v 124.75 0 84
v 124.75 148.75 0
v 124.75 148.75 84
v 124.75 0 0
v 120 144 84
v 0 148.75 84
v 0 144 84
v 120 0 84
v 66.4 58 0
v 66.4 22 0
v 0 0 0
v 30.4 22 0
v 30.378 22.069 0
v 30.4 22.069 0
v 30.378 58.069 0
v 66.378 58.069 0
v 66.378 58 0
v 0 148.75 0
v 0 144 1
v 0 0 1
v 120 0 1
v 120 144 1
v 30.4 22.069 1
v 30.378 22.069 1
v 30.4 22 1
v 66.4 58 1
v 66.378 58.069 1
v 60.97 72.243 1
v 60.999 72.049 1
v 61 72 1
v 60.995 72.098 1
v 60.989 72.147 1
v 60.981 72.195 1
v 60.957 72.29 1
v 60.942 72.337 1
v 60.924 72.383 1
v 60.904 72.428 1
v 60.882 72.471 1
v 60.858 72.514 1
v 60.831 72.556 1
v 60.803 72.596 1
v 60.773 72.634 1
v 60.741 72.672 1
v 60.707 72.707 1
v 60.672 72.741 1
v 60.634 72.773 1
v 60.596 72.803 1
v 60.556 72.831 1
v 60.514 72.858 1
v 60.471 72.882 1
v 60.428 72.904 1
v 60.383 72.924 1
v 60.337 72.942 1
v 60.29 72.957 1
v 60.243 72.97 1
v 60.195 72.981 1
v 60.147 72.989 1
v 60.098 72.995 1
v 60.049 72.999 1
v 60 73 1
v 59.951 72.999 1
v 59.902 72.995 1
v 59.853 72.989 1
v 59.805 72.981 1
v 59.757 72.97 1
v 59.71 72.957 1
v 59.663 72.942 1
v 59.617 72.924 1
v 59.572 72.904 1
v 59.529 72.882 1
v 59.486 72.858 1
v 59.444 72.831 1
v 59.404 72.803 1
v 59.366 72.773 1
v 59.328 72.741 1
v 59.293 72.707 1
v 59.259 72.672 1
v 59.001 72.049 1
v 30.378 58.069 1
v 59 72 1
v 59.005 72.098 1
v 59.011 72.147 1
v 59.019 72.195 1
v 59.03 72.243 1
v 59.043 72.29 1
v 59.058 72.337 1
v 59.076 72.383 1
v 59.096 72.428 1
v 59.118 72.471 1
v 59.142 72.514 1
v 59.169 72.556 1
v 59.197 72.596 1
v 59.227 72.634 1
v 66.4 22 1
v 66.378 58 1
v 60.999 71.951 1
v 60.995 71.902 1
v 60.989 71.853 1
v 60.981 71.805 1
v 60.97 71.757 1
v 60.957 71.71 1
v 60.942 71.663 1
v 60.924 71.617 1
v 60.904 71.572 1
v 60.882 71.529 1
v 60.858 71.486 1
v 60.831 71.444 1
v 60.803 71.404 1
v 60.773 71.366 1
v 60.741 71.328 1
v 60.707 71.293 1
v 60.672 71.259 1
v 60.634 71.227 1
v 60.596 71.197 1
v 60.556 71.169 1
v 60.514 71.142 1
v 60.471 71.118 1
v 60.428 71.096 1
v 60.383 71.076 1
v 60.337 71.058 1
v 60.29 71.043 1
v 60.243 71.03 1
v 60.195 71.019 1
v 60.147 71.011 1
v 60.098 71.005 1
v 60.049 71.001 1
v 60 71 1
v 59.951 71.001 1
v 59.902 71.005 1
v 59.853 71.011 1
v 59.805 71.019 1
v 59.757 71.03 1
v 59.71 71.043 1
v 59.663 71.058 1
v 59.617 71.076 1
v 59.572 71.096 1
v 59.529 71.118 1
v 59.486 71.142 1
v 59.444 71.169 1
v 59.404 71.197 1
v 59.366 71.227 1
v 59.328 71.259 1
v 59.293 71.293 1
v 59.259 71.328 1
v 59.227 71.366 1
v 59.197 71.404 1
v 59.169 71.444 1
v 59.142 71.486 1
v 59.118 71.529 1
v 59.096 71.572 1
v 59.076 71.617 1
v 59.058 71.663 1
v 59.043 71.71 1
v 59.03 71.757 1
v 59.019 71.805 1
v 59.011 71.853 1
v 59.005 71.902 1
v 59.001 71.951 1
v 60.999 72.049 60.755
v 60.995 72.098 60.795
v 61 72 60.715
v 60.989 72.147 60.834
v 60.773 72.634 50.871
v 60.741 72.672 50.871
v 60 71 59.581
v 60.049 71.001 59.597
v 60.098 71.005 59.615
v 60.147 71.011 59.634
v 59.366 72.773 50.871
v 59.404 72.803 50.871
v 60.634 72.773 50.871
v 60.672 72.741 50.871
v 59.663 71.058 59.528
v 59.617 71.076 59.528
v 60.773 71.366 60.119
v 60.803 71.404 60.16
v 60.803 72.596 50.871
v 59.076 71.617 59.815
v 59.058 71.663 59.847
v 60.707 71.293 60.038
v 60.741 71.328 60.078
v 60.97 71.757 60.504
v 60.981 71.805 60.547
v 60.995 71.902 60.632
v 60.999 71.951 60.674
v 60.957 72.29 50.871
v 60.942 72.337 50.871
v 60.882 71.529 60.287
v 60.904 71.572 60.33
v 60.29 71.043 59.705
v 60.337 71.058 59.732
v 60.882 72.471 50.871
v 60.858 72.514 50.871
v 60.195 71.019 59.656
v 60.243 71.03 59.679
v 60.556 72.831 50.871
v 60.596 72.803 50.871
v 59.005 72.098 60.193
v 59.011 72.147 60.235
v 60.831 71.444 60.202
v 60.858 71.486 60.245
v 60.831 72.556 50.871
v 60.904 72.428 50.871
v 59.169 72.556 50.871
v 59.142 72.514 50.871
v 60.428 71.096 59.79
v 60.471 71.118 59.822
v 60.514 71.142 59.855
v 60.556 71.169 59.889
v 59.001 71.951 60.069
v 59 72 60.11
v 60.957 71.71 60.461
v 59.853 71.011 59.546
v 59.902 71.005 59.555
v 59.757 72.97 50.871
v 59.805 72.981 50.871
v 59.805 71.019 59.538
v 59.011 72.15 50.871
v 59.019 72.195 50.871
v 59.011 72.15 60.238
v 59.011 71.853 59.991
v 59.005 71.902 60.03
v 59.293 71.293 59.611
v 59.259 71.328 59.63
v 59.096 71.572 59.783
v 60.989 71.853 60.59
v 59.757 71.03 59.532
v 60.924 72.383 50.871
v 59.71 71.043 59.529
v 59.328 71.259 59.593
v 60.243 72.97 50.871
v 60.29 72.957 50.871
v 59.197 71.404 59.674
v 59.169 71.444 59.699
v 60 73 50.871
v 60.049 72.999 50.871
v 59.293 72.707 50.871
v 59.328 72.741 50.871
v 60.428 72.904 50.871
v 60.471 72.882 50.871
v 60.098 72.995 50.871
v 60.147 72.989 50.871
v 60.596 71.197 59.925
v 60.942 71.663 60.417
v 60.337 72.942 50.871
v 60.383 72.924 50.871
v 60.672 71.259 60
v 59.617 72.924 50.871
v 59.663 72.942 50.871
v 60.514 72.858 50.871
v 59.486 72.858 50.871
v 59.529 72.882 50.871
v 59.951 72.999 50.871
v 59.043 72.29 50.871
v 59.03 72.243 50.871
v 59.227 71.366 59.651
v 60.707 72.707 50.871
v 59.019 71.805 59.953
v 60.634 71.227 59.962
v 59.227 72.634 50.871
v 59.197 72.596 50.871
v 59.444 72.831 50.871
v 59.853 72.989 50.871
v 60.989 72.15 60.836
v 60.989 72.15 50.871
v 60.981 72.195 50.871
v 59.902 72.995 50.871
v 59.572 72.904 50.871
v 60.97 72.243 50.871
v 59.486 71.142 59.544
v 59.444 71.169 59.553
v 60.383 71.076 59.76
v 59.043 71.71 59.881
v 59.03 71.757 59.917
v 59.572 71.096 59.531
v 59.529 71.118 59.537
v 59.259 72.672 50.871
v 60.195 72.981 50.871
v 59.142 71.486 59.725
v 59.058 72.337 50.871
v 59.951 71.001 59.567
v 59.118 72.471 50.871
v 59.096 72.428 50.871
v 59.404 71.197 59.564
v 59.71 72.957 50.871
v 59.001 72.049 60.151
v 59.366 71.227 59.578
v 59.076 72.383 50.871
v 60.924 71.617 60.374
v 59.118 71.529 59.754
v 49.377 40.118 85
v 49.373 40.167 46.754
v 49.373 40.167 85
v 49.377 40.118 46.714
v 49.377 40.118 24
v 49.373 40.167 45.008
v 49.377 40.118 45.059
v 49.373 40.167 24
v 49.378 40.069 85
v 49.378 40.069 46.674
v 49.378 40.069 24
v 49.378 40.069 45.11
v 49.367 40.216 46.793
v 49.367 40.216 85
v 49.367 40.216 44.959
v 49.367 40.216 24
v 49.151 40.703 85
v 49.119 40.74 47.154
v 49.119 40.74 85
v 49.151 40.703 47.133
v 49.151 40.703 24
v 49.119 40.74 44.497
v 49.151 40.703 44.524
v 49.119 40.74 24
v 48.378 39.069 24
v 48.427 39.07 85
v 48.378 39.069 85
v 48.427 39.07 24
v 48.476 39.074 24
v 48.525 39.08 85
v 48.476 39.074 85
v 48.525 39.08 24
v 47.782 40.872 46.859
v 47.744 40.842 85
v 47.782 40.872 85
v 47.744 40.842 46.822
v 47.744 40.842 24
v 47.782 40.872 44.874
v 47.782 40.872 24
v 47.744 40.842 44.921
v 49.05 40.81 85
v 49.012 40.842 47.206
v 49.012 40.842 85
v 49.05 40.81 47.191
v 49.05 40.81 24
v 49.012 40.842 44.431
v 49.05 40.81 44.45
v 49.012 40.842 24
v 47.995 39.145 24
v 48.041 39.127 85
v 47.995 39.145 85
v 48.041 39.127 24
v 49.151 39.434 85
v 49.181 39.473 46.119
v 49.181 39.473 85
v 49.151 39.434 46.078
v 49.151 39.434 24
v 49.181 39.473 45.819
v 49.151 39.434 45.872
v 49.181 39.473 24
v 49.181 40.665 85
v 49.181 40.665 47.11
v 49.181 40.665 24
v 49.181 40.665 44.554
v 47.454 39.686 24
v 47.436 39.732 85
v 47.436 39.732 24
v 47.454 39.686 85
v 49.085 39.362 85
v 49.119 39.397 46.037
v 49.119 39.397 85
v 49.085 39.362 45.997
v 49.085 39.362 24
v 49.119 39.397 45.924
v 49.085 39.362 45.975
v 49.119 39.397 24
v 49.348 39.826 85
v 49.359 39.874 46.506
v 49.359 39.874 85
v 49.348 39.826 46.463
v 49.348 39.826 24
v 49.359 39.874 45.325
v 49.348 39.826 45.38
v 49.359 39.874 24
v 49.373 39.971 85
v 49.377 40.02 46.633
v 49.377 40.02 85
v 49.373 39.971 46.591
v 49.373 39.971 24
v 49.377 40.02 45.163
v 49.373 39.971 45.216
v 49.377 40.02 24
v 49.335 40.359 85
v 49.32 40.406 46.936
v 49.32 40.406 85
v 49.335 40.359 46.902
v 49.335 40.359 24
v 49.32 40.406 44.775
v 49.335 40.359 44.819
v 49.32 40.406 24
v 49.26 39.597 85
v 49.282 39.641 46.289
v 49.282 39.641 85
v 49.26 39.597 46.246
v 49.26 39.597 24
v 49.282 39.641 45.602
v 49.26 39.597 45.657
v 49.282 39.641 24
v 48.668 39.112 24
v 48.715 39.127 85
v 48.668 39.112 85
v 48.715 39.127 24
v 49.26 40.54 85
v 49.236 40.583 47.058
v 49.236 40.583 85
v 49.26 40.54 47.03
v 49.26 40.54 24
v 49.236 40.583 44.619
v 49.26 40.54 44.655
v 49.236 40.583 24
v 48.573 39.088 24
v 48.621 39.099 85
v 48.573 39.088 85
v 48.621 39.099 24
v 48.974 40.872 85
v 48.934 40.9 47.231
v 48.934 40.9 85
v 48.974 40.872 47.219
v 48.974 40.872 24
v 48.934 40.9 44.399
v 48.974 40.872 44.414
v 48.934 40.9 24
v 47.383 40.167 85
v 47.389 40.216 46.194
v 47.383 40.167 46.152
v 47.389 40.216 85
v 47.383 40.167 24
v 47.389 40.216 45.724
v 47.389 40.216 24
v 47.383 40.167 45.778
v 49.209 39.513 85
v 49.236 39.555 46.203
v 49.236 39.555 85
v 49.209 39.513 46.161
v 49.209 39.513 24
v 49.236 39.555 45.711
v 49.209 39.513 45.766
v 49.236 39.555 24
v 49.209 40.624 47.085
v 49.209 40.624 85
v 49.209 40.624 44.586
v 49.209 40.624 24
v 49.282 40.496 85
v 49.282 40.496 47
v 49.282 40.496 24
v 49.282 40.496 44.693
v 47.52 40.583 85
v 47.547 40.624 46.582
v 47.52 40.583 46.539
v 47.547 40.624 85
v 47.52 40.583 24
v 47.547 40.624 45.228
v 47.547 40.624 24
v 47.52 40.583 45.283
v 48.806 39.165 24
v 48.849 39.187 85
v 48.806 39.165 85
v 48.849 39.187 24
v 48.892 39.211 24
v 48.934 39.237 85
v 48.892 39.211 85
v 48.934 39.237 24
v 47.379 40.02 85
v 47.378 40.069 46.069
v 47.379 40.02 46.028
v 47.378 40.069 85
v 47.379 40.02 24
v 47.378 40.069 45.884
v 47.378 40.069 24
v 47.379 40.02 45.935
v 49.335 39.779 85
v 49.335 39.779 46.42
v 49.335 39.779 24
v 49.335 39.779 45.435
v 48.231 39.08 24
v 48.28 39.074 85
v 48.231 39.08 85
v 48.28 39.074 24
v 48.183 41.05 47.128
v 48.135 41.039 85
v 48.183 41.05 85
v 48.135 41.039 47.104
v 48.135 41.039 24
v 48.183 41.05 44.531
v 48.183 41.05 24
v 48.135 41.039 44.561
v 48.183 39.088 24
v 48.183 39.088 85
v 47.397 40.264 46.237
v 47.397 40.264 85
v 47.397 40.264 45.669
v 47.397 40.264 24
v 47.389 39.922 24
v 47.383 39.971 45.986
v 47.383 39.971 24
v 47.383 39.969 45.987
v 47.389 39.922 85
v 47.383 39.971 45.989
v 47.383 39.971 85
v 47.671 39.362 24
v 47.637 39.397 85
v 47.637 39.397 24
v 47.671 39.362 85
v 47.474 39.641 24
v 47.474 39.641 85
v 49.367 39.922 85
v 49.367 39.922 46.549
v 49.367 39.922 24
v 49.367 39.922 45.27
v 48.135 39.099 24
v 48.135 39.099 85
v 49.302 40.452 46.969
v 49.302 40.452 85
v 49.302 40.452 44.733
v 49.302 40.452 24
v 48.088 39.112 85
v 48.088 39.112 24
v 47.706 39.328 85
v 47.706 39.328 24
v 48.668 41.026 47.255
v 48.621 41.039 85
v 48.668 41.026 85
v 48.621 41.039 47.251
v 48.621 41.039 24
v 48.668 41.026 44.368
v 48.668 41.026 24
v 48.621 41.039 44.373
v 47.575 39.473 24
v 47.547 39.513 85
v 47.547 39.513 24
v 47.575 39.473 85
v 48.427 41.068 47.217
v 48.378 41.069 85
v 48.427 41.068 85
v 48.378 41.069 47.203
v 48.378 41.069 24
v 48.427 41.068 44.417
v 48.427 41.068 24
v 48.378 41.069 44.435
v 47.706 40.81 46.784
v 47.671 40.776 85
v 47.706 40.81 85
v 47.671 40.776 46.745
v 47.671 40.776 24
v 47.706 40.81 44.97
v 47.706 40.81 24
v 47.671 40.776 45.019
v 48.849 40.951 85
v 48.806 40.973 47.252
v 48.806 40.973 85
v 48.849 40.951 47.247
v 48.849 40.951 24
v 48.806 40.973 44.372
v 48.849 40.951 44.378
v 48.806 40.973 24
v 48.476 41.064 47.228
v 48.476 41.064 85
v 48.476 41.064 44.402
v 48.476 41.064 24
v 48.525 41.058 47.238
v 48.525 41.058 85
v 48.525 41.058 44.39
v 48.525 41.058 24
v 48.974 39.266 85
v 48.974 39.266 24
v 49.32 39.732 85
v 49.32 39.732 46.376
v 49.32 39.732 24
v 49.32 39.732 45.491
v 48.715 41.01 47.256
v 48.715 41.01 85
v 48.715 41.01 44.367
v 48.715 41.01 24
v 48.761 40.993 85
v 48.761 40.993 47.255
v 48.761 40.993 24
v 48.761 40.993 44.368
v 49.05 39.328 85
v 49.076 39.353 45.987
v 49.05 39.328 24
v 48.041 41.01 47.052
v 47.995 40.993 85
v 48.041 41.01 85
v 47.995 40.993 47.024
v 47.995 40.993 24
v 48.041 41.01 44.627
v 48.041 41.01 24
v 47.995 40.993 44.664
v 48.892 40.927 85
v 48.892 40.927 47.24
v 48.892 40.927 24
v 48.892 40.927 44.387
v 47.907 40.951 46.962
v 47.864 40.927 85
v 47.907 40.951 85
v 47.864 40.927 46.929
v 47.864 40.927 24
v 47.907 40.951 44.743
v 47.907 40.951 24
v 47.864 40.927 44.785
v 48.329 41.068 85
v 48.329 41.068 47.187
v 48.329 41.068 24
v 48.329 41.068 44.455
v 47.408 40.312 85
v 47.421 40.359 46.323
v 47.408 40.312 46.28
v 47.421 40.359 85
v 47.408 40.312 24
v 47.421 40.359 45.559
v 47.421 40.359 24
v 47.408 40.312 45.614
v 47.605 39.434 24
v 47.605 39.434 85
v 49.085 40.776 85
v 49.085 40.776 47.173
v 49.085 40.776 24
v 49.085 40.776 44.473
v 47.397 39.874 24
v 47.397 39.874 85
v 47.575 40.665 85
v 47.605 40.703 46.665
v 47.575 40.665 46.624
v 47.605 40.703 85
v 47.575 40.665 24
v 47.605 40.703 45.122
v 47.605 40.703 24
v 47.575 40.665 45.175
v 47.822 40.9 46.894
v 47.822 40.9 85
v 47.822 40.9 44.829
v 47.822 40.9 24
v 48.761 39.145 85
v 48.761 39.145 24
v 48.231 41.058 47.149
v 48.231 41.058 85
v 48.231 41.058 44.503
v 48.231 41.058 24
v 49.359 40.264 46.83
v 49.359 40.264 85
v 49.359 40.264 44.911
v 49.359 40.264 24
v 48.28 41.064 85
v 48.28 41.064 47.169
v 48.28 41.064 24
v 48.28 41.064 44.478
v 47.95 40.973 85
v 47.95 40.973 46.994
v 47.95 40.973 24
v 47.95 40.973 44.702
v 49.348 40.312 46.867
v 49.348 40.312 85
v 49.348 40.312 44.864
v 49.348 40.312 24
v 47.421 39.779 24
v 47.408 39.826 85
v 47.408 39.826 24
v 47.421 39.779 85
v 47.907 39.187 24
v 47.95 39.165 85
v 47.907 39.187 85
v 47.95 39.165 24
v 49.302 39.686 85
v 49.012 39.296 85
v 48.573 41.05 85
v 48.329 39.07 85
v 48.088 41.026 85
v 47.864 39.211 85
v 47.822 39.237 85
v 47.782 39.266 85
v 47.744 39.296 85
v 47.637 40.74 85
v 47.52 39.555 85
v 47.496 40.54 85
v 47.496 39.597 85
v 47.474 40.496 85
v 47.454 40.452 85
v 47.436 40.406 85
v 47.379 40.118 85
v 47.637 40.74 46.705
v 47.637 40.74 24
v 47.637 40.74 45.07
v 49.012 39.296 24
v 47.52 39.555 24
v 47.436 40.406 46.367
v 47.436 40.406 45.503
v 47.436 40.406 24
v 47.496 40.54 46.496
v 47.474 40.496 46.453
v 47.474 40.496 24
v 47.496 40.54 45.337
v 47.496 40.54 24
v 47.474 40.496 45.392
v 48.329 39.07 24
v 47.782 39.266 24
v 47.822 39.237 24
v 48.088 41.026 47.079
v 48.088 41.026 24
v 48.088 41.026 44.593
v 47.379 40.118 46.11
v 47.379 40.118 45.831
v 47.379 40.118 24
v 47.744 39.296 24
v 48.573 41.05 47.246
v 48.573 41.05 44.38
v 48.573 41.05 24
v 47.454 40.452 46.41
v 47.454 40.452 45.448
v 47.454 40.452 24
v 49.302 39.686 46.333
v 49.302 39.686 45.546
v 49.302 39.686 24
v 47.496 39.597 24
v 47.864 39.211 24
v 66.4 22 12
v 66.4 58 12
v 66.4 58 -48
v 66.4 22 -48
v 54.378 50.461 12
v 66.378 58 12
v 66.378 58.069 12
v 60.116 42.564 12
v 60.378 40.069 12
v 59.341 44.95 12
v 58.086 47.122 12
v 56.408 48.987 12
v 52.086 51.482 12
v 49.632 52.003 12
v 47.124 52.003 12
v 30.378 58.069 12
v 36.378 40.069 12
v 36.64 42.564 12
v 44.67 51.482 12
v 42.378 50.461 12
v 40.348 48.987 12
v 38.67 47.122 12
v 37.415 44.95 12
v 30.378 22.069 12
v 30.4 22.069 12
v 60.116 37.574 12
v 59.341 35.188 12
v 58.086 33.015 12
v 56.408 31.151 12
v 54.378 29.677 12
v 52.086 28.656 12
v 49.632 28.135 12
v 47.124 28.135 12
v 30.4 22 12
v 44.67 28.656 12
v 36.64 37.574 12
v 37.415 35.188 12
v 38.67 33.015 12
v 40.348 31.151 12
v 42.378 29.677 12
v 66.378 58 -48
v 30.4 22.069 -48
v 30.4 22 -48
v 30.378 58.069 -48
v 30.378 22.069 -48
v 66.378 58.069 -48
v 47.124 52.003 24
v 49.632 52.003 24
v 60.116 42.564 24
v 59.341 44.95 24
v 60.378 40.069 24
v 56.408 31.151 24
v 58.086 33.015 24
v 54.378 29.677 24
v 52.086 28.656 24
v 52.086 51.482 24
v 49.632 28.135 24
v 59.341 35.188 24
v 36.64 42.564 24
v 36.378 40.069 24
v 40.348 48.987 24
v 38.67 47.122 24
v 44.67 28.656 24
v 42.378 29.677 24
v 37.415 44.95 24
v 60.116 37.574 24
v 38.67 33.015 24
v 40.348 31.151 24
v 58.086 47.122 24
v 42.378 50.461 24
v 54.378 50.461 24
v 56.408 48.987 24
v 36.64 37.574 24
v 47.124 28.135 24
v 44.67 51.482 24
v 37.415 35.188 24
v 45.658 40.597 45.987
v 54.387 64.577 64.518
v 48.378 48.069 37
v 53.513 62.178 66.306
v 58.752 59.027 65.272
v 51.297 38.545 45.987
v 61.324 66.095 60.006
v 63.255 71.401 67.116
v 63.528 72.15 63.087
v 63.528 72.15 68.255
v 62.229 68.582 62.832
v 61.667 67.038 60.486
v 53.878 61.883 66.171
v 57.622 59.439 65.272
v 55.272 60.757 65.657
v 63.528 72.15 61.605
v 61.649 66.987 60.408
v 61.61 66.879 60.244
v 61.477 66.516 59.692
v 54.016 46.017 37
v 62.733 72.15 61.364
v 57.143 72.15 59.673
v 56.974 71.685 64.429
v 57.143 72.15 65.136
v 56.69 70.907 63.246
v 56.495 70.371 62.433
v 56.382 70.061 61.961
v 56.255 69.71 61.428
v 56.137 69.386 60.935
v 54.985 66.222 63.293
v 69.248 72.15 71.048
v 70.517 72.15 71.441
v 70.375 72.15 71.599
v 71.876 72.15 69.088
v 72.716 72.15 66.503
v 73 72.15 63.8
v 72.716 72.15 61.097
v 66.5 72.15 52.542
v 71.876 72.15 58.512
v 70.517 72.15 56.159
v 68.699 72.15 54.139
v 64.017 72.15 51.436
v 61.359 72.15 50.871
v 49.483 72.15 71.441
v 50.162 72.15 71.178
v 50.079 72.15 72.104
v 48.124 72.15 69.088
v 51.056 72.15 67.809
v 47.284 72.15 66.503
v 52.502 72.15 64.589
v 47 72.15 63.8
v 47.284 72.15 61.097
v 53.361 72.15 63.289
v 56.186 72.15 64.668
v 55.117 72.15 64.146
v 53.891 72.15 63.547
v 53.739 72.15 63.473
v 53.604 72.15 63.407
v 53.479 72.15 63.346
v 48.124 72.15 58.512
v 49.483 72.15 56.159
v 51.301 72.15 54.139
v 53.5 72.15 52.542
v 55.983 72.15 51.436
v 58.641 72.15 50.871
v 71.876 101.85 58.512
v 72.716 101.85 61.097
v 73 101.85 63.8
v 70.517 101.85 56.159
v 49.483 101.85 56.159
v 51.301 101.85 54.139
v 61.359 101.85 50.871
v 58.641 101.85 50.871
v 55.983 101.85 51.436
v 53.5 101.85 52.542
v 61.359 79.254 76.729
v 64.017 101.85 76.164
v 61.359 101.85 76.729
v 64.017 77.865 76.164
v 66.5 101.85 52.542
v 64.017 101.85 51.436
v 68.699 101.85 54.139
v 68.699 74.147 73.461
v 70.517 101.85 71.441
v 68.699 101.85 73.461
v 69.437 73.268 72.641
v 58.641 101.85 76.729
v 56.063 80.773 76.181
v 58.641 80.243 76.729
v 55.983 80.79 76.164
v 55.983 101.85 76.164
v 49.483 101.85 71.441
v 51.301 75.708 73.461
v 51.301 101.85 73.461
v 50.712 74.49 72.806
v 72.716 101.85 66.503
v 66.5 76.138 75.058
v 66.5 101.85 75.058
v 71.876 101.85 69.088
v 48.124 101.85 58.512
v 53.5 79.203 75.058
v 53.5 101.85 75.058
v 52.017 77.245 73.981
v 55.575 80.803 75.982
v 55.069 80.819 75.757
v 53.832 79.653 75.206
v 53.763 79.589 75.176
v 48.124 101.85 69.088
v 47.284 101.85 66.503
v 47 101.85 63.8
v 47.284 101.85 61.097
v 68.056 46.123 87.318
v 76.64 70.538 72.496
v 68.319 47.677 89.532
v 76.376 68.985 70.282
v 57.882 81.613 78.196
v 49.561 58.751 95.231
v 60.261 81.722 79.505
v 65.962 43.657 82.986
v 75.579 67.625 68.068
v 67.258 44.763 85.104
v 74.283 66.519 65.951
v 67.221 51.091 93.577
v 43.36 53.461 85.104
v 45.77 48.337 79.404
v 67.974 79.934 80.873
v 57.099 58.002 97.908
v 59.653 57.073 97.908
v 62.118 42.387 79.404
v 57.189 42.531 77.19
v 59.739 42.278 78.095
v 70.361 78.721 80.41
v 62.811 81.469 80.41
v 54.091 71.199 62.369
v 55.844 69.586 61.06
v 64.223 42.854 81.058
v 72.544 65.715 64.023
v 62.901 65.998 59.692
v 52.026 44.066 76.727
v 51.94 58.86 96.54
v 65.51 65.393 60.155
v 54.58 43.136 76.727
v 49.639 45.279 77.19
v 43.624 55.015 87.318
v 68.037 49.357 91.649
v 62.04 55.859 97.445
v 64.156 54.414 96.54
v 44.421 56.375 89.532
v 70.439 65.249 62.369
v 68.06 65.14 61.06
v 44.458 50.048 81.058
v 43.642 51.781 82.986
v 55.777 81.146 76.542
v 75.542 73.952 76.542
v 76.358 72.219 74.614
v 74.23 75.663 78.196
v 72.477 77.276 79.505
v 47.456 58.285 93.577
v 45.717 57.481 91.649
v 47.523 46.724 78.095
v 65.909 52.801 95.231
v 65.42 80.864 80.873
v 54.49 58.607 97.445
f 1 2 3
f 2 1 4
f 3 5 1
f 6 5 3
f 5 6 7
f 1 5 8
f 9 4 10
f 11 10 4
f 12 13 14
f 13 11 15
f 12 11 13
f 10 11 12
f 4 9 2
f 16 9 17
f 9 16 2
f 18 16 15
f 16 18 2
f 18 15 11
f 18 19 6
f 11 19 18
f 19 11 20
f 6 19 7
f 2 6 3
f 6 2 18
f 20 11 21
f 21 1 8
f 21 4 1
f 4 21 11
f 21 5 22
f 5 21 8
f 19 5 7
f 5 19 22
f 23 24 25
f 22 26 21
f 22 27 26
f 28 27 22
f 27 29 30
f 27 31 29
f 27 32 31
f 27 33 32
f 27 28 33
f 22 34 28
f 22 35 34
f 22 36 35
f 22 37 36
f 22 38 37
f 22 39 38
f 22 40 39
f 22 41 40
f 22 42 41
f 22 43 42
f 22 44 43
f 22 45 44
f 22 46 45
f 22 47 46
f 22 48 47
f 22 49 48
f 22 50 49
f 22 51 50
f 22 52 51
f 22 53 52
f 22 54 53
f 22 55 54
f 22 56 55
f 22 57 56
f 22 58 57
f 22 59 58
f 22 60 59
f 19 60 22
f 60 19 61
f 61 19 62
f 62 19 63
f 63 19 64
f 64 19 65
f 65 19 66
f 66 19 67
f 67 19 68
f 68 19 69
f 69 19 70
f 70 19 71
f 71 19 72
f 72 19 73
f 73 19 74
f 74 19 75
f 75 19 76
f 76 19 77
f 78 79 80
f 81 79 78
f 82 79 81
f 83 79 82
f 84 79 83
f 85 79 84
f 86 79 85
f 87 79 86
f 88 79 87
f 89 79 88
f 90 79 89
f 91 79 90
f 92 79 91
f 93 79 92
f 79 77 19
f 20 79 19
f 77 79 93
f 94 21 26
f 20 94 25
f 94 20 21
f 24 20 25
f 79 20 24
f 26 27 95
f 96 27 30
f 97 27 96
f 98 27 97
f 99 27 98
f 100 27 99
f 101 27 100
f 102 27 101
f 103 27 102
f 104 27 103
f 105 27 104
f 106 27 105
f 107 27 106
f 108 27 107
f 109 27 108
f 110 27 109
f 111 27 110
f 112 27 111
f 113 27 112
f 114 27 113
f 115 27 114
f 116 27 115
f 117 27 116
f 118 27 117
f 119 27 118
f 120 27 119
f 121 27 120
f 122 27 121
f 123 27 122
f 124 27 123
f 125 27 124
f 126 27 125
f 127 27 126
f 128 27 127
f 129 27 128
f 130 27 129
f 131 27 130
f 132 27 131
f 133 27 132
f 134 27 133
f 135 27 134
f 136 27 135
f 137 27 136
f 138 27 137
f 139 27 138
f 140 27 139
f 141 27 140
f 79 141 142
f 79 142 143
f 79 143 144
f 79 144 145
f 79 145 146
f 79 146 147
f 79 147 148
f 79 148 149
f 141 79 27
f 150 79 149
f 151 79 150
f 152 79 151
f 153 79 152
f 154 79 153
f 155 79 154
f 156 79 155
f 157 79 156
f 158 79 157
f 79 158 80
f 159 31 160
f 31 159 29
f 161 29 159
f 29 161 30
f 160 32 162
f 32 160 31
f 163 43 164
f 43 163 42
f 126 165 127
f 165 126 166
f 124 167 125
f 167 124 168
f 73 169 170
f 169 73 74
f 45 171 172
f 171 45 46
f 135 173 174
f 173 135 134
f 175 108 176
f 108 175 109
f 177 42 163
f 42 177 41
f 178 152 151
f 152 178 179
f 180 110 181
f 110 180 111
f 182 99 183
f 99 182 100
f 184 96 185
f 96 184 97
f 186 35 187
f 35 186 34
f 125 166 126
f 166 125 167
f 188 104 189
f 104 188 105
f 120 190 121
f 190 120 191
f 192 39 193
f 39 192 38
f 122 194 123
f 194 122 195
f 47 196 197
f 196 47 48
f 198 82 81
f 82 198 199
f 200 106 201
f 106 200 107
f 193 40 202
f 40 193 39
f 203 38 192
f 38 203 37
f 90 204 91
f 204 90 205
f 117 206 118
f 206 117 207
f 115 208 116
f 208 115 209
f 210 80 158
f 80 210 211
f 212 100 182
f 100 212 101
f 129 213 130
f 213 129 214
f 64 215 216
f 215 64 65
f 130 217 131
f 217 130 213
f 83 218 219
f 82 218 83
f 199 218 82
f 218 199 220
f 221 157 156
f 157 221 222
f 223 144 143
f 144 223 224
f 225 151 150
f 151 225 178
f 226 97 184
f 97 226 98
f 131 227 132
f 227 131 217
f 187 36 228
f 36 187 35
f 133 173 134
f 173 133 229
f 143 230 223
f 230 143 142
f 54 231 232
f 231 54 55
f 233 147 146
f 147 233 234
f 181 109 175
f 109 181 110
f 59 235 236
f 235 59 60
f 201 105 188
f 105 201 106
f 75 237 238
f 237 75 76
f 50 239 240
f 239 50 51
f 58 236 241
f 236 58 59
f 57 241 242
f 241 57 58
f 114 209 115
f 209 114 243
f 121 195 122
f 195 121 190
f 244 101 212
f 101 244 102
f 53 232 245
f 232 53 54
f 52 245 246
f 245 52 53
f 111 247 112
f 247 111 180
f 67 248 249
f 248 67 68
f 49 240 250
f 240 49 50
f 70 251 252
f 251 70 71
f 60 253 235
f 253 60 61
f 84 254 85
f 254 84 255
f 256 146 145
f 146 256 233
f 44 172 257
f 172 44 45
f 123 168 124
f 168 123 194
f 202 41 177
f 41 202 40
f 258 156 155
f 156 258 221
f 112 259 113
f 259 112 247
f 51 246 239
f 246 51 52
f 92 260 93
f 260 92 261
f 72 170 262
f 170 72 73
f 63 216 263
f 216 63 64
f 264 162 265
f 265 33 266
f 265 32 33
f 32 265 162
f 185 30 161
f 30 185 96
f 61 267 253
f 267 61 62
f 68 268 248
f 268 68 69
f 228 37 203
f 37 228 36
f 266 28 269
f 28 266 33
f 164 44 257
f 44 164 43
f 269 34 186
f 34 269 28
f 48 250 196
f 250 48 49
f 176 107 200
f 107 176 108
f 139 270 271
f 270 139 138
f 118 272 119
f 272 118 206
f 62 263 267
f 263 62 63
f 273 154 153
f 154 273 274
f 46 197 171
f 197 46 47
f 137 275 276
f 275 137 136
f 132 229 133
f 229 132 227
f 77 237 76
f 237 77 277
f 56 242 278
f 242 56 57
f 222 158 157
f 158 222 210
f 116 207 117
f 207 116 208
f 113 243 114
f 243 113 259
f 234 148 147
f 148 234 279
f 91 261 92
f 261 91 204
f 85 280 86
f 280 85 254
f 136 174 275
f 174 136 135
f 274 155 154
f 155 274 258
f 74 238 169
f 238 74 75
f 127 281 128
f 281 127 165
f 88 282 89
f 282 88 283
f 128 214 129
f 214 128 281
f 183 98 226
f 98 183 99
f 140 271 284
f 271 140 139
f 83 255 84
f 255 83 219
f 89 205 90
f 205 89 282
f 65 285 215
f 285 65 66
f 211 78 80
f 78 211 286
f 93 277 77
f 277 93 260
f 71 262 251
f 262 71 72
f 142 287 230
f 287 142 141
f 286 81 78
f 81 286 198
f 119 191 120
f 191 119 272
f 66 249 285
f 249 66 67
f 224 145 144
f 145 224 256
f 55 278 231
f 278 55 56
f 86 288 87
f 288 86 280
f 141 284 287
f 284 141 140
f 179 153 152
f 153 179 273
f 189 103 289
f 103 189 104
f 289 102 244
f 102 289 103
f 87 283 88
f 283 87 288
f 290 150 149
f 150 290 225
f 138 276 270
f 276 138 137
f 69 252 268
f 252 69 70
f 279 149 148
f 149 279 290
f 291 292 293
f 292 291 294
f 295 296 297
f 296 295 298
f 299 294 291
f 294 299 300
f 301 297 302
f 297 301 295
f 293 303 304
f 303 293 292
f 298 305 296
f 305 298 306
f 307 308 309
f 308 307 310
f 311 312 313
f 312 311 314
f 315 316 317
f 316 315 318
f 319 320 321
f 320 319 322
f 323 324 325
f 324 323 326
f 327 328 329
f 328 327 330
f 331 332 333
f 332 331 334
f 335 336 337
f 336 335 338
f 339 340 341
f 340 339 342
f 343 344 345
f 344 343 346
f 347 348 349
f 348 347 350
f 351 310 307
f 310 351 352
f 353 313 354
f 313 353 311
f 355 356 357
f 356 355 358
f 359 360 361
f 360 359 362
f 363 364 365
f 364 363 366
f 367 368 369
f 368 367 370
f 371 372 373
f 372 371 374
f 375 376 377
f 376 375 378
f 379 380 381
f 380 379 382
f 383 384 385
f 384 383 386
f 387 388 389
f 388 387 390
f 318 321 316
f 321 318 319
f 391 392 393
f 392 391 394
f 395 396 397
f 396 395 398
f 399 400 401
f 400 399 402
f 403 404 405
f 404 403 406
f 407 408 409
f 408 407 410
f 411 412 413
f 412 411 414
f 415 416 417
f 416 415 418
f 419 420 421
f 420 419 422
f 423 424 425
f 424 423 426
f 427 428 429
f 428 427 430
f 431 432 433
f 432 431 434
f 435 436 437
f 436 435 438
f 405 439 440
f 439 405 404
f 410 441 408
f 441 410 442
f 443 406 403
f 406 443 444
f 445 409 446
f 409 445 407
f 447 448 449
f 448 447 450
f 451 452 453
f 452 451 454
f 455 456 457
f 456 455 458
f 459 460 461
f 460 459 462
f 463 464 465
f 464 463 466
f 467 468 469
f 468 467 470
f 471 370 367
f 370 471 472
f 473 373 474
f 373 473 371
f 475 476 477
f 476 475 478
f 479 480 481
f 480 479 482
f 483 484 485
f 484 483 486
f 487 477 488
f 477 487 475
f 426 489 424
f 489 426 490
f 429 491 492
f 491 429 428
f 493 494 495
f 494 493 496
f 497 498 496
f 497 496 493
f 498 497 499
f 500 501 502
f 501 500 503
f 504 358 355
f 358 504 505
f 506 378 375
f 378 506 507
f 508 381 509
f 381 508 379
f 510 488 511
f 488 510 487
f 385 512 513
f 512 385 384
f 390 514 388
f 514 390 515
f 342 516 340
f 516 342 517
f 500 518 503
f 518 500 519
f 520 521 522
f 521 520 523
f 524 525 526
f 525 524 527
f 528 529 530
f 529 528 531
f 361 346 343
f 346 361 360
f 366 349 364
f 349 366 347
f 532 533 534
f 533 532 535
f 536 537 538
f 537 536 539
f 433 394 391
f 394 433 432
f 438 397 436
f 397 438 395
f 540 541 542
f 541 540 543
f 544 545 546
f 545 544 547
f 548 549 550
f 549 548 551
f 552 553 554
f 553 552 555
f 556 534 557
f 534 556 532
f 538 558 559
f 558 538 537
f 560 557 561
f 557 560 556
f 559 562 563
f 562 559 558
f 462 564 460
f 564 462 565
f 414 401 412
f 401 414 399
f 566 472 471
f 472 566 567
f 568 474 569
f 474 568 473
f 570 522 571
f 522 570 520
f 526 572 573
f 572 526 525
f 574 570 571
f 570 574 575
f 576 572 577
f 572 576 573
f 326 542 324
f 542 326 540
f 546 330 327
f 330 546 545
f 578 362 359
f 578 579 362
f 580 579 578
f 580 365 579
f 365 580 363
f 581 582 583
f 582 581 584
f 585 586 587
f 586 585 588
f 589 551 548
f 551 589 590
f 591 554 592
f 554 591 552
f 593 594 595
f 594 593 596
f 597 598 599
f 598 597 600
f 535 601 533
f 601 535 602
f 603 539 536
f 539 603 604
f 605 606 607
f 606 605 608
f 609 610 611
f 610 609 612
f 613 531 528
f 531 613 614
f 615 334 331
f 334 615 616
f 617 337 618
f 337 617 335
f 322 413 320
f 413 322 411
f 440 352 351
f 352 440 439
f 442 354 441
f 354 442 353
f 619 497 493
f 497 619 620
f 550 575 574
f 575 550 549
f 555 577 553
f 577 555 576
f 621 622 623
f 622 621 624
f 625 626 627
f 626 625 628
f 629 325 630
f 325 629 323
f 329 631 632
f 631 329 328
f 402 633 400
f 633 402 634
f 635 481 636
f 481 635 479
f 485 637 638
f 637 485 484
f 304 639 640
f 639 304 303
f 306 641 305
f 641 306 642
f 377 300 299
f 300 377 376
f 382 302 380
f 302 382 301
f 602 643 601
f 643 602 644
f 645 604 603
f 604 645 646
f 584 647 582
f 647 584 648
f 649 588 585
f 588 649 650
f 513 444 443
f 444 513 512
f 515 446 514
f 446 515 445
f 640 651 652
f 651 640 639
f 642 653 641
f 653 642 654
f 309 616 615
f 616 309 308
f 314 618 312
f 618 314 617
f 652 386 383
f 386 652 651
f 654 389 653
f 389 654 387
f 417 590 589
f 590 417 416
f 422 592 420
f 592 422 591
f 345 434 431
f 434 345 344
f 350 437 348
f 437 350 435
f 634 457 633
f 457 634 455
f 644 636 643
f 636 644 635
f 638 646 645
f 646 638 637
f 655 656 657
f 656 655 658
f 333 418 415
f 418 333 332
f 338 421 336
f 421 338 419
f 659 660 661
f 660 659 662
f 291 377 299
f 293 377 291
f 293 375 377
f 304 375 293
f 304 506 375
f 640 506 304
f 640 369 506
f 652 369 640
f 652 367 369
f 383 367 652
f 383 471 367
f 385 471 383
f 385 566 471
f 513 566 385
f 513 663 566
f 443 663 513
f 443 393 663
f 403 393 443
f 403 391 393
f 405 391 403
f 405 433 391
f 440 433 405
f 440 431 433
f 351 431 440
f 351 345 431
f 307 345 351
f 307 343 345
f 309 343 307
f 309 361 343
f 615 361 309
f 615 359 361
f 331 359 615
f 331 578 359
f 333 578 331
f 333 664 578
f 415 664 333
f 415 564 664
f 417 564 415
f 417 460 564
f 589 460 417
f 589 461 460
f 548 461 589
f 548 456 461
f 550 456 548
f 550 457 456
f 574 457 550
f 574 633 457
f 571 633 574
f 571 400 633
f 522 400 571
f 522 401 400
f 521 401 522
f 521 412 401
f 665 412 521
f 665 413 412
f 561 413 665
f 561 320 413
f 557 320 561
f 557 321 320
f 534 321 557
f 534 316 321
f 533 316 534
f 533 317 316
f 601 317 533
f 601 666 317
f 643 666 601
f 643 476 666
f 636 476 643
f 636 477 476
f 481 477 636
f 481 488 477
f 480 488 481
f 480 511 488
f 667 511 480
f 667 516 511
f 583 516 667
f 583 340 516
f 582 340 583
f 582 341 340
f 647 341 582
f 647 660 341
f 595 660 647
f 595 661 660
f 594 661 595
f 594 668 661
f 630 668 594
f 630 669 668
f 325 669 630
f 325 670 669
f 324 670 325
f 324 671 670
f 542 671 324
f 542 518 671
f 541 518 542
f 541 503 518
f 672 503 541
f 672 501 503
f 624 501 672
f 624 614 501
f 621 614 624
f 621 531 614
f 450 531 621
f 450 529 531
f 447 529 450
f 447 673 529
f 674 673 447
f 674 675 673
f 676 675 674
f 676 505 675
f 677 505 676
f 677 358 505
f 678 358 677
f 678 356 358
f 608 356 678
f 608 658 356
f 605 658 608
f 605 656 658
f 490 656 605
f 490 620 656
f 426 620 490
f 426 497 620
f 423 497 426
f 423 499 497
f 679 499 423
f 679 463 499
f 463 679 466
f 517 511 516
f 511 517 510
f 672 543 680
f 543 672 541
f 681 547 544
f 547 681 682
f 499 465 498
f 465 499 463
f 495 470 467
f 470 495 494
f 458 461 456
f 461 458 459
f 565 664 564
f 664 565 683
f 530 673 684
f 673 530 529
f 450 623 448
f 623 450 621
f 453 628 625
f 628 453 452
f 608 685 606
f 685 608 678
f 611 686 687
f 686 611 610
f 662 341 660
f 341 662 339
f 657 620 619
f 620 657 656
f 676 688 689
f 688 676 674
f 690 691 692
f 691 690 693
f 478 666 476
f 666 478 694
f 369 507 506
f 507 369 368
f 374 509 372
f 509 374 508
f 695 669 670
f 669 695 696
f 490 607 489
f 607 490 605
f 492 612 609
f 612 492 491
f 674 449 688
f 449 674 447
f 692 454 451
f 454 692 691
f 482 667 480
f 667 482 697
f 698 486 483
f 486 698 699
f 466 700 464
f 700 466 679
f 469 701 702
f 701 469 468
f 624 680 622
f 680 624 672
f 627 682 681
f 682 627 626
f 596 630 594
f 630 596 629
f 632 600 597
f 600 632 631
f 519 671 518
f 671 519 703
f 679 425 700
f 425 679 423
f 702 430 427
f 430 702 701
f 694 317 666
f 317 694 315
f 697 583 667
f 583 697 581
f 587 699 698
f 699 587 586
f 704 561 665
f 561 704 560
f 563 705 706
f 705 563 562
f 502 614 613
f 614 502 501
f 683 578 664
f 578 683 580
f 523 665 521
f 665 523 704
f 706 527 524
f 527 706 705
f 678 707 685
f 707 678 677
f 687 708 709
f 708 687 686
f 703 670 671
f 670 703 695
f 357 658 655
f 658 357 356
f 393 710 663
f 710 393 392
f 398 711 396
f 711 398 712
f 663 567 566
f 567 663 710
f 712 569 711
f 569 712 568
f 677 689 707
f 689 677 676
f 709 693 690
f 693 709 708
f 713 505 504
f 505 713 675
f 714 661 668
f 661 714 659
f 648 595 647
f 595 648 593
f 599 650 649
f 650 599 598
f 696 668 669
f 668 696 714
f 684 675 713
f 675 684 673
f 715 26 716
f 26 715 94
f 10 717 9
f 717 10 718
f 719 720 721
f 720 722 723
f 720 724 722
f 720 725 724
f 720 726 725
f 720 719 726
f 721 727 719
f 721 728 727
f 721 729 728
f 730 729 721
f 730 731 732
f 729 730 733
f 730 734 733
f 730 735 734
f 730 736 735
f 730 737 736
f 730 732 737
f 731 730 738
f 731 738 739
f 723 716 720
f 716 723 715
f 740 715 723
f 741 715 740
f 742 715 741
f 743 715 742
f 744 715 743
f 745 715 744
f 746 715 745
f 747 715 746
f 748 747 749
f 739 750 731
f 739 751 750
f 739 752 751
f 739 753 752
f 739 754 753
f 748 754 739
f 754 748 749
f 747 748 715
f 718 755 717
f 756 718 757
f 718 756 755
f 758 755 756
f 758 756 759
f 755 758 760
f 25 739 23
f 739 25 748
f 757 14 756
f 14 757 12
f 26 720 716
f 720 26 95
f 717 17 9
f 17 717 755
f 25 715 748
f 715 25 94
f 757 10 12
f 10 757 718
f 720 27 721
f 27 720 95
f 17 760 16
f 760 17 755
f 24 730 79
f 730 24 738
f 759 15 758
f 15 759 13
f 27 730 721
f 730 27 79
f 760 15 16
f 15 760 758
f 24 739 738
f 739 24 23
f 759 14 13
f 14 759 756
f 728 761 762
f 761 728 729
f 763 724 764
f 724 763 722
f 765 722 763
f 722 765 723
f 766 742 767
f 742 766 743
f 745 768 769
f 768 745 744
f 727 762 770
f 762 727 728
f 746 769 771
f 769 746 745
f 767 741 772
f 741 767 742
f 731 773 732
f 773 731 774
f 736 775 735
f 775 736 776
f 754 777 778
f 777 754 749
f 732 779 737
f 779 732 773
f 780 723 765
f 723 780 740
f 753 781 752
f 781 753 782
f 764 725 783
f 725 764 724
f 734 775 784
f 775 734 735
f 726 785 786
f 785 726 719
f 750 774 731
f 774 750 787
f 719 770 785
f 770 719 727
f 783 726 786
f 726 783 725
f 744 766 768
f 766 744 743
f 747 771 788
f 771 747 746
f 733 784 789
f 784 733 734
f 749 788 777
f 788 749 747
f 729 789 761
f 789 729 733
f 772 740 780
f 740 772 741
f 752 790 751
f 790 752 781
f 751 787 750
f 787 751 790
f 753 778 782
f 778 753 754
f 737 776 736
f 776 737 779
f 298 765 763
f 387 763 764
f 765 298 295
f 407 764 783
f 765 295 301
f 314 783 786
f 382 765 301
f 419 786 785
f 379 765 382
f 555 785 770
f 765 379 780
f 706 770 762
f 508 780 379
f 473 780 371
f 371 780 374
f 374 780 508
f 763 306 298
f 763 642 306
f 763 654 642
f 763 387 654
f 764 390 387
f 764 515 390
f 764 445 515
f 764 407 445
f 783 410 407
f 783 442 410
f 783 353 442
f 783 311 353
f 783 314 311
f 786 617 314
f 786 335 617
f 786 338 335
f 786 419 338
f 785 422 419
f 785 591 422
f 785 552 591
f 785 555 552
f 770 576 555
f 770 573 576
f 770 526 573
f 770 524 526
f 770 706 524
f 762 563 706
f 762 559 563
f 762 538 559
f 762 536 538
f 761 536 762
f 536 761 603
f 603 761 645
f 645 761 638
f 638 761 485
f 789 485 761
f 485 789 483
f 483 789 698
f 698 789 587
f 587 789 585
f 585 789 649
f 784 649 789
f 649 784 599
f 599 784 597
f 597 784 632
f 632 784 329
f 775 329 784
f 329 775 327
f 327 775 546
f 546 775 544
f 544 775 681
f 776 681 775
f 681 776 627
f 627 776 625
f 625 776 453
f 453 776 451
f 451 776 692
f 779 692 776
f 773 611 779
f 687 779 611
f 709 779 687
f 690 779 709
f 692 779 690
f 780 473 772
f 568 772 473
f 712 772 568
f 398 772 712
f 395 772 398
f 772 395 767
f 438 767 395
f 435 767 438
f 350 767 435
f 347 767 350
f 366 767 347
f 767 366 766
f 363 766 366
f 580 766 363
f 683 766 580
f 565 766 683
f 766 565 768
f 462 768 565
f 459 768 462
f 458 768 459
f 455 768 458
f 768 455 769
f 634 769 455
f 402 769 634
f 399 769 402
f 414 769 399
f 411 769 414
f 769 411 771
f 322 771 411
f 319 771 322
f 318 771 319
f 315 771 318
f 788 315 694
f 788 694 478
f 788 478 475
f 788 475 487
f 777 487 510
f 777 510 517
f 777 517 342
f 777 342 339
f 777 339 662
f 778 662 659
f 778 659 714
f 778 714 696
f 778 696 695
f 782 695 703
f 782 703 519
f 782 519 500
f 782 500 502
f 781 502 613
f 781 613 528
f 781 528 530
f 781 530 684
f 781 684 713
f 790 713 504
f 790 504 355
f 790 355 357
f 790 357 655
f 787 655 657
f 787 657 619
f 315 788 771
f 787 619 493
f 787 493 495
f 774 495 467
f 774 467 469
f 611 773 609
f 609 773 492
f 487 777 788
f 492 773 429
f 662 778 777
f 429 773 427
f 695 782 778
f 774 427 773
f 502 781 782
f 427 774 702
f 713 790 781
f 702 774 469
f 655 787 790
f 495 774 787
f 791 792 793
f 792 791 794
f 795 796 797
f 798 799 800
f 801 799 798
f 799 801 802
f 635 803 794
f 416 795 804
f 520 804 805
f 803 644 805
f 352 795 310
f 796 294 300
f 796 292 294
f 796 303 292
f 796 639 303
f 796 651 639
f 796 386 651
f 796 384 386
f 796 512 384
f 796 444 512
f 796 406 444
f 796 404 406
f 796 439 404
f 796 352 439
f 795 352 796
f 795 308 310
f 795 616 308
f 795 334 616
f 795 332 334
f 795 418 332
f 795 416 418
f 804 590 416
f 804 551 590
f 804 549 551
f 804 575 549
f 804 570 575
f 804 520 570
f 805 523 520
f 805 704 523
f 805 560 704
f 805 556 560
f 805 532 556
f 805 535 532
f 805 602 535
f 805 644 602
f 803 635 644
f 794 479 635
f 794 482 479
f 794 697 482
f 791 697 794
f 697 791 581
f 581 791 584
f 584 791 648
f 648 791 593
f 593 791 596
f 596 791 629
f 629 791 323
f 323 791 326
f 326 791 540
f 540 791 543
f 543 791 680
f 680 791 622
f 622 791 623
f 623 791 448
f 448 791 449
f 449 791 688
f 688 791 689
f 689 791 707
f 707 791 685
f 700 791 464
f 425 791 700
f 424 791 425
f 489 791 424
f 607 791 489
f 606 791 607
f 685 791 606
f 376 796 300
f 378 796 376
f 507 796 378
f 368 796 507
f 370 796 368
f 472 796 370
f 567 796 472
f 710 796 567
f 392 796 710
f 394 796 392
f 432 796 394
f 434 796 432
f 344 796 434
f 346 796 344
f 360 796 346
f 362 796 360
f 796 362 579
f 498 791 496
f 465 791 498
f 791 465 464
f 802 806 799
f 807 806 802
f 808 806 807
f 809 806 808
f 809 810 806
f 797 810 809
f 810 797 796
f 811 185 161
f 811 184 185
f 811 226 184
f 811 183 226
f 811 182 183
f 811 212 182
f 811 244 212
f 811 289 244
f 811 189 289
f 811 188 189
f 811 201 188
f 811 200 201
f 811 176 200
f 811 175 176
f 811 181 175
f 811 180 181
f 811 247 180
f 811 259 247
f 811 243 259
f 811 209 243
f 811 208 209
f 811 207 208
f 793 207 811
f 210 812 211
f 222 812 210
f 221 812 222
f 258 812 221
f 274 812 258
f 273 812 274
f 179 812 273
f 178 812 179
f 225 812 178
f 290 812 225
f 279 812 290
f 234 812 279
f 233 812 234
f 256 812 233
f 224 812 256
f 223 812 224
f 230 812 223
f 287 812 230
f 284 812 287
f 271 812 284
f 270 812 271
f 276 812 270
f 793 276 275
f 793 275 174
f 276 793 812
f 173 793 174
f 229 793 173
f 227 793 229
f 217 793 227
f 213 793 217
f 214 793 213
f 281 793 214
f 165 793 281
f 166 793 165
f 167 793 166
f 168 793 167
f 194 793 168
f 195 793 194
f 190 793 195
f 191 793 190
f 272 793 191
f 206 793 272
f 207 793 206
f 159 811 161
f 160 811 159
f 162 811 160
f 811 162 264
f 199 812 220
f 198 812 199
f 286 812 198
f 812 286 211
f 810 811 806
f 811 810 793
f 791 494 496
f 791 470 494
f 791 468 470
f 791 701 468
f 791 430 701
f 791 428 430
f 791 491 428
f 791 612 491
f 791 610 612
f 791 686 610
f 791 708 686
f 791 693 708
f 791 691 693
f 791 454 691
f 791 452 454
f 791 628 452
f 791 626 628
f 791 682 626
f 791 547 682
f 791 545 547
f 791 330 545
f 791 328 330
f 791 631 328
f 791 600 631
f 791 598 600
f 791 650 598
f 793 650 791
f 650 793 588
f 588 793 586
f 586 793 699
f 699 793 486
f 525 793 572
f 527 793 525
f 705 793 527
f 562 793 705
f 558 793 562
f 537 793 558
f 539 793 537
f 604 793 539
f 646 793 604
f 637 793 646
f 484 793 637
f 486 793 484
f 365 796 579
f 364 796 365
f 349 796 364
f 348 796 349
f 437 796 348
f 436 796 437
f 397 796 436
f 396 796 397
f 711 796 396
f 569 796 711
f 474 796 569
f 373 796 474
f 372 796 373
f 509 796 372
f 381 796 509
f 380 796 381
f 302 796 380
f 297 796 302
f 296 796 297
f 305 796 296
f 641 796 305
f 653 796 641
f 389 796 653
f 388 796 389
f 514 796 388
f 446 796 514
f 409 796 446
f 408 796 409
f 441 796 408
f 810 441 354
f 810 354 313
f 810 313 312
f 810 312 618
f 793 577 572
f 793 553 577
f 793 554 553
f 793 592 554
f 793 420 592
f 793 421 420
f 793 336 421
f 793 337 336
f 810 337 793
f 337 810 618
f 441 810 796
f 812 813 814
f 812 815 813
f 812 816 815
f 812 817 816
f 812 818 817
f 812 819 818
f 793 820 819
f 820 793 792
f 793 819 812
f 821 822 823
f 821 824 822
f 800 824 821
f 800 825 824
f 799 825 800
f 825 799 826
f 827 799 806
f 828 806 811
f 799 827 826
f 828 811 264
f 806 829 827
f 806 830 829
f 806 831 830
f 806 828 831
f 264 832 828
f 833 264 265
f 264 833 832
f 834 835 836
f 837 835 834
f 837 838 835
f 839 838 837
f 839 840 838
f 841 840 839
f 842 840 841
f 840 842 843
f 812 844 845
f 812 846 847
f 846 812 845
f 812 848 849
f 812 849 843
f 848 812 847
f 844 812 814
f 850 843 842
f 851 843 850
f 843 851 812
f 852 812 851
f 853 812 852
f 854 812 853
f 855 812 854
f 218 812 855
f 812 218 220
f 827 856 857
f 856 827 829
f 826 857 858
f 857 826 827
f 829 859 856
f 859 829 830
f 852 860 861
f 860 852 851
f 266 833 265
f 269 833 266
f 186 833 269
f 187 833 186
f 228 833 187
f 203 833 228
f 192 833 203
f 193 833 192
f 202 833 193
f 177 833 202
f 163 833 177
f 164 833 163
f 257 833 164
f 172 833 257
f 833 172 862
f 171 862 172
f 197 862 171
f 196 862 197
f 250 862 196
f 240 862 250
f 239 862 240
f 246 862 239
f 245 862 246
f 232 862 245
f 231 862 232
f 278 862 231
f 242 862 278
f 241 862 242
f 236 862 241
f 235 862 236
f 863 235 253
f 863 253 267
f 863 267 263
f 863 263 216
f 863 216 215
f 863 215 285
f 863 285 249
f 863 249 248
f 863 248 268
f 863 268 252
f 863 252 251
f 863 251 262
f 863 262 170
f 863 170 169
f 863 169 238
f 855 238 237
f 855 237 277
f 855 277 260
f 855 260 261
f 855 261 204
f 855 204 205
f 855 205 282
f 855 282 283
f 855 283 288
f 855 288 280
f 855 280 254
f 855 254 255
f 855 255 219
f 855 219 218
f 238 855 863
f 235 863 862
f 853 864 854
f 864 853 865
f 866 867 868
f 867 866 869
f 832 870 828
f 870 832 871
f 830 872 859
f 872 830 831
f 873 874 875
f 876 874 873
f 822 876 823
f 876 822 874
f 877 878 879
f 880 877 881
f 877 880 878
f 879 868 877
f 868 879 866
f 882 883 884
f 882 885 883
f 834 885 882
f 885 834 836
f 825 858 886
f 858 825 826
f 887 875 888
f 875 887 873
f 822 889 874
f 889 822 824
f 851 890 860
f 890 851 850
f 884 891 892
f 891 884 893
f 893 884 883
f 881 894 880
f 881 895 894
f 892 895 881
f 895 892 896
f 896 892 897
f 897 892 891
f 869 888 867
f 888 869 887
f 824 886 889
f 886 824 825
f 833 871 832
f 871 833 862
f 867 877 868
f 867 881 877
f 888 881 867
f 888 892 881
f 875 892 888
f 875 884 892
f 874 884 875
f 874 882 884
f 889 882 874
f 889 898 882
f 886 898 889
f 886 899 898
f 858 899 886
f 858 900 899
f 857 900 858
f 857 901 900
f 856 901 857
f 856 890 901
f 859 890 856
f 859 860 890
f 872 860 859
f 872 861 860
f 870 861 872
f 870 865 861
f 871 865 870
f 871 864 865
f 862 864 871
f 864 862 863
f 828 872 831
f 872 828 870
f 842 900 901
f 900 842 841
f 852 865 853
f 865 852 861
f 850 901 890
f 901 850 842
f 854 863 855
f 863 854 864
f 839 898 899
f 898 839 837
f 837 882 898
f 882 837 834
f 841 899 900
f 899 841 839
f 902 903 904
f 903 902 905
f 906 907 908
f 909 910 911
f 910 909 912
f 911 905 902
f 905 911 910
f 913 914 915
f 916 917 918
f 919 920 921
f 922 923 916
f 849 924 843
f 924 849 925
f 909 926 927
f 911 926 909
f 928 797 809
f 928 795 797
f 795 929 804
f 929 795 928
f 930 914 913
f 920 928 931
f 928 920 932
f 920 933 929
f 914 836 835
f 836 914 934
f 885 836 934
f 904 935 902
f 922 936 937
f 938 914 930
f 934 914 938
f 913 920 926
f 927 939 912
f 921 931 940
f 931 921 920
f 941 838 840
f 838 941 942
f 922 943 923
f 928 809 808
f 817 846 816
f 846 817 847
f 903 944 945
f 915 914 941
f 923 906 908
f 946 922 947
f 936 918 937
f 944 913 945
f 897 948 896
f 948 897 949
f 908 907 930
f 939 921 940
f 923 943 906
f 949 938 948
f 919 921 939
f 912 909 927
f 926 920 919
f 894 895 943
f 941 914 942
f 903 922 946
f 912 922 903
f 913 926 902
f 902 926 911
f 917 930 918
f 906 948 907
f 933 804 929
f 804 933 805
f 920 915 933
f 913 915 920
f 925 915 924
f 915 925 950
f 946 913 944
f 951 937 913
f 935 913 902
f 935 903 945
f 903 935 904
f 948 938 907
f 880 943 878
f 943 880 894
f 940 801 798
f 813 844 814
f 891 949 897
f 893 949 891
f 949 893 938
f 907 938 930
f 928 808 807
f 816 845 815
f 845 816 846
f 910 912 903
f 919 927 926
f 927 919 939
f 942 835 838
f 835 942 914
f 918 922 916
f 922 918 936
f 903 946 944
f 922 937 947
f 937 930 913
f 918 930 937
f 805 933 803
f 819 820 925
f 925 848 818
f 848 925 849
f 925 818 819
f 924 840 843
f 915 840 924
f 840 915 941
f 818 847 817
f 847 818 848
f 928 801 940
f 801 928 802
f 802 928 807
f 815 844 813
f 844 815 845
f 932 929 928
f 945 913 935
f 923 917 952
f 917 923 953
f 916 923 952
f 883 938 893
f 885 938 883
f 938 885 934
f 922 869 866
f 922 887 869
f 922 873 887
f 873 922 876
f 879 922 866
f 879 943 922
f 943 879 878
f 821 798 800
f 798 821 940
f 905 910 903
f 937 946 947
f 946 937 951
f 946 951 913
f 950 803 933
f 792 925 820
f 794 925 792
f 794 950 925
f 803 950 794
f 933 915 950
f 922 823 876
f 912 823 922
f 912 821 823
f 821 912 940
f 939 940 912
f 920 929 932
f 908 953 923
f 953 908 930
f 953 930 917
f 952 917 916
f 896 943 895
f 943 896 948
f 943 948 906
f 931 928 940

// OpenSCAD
// lukeroberto213@gmail.com


inches = 25.4;
width = 10 * 12;
length = 20 *12;
height = 7 * 12;
wallThickness = 3.5 + 0.5 + 0.75;
cPierSize = 30;
cPierHight = 12;
cPierOffSetX = 10;
cPierOffSetZ = 6;
OTAODiameter = 26;
OTAThickness = 1;
OTALength = 29.7;
mountLength = 42.7;
mountWidth = 12;
mountThickness = 2;

insideWidth = 10*12;
insideLength = 12*12;
floorThickness = 1;

scopePierAboveFloor =12;
scopePierX = 36;
scopePierY = 36;
scopePierZ = 4*12+scopePierAboveFloor;


angleFromNorth=20;
latitude=41.5;
wedgeX = 2;


module floor ()
{
    cube([insideWidth, insideLength, floorThickness]);
}
module scopePier()
{
    
   cube([scopePierX, scopePierY, scopePierZ]);
}
    

module centerMarker()
{
     cylinder(h = 7*12, r = 1, center=false,$fn=128);
}


module drillX(x, y, z, diameter, l)
{
    translate([0,y, z])
    {     
        {  
            rotate([0,90,0])
            {                         
                cylinder(h=l,d=diameter, center=true,$fn=128);
            }
        }
    }
}


module drawWedge ()
{

}

module drawOTA ()
{
    difference ()
        {
            cylinder( d = OTAODiameter, OTALength, center=true);
            
            
        }
}





module drawFrame ()
{
    color ("black", 1.0)
    {
        translate([0,0,0])
        {
            difference()
            {     
                cube ([width + (wallThickness * 2), height, length + (wallThickness * 2)]);
                translate ([wallThickness, 0, wallThickness])
                {
                    cube ([width , height * 2, length ]);
                }       
            
            }   
        }
    }
}





module walls ()
{
    difference ()
    {
         cube ([insideWidth + wallThickness, insideLength + wallThickness, 7*12]);
         cube ([insideWidth , insideLength , 7*12]);
    }
   
    
}
module mount()
{
    cube([6, 42, 12]);
}
module metalPier()
{
    cylinder(d=24,h=12,center=true);
}
scopeDisplacementX = cos(latitude)*mountLength + wedgeX;
echo (scopeDisplacementX);

dx = sin (angleFromNorth) * scopeDisplacementX;
dy = cos (angleFromNorth) * scopeDisplacementX;
echo(dx, dy);

centerX = insideWidth/2;
centerY= insideLength/2;

color("yellow") floor();
color("green") translate ([centerX, centerY, 1]) centerMarker();



pierCenterX = centerX-dx;
pierCenterY = centerY-dy;
echo (pierCenterX, pierCenterY);
color("green") translate ([pierCenterX, pierCenterY, 1]) centerMarker();
//translate([pierCenterX, pierCenterY, scopePierAboveFloor])text(size=2,"center");

color ("red") translate ([48.4-scopePierX/2, 40-scopePierY/2,-scopePierZ+scopePierAboveFloor]) scopePier();
color ("red") translate ([centerX-dx-scopePierX/2, centerY-dy-scopePierY/2,-scopePierZ+scopePierAboveFloor]) scopePier();

color("orange") translate ([pierCenterX, pierCenterY, scopePierAboveFloor+12/2]) metalPier();


color("white") translate ([pierCenterX, pierCenterY+2+6,scopePierAboveFloor+12+13])rotate([latitude,0,-20]) mount();
//color("black",0.5) translate ([centerX, centerY, 12+13.5+28.3+OTALength]) drawOTA();

color("black",0.5) translate ([centerX, centerY+15, 12+13.5+28.3+10]) rotate([270,0,0]) drawOTA();

color("black",0.5) translate ([centerX, centerY-10, 12+13.5+28.3+10+10+5]) rotate([135+90+10,0,-20]) drawOTA();
color("brown", 0.4) walls();
